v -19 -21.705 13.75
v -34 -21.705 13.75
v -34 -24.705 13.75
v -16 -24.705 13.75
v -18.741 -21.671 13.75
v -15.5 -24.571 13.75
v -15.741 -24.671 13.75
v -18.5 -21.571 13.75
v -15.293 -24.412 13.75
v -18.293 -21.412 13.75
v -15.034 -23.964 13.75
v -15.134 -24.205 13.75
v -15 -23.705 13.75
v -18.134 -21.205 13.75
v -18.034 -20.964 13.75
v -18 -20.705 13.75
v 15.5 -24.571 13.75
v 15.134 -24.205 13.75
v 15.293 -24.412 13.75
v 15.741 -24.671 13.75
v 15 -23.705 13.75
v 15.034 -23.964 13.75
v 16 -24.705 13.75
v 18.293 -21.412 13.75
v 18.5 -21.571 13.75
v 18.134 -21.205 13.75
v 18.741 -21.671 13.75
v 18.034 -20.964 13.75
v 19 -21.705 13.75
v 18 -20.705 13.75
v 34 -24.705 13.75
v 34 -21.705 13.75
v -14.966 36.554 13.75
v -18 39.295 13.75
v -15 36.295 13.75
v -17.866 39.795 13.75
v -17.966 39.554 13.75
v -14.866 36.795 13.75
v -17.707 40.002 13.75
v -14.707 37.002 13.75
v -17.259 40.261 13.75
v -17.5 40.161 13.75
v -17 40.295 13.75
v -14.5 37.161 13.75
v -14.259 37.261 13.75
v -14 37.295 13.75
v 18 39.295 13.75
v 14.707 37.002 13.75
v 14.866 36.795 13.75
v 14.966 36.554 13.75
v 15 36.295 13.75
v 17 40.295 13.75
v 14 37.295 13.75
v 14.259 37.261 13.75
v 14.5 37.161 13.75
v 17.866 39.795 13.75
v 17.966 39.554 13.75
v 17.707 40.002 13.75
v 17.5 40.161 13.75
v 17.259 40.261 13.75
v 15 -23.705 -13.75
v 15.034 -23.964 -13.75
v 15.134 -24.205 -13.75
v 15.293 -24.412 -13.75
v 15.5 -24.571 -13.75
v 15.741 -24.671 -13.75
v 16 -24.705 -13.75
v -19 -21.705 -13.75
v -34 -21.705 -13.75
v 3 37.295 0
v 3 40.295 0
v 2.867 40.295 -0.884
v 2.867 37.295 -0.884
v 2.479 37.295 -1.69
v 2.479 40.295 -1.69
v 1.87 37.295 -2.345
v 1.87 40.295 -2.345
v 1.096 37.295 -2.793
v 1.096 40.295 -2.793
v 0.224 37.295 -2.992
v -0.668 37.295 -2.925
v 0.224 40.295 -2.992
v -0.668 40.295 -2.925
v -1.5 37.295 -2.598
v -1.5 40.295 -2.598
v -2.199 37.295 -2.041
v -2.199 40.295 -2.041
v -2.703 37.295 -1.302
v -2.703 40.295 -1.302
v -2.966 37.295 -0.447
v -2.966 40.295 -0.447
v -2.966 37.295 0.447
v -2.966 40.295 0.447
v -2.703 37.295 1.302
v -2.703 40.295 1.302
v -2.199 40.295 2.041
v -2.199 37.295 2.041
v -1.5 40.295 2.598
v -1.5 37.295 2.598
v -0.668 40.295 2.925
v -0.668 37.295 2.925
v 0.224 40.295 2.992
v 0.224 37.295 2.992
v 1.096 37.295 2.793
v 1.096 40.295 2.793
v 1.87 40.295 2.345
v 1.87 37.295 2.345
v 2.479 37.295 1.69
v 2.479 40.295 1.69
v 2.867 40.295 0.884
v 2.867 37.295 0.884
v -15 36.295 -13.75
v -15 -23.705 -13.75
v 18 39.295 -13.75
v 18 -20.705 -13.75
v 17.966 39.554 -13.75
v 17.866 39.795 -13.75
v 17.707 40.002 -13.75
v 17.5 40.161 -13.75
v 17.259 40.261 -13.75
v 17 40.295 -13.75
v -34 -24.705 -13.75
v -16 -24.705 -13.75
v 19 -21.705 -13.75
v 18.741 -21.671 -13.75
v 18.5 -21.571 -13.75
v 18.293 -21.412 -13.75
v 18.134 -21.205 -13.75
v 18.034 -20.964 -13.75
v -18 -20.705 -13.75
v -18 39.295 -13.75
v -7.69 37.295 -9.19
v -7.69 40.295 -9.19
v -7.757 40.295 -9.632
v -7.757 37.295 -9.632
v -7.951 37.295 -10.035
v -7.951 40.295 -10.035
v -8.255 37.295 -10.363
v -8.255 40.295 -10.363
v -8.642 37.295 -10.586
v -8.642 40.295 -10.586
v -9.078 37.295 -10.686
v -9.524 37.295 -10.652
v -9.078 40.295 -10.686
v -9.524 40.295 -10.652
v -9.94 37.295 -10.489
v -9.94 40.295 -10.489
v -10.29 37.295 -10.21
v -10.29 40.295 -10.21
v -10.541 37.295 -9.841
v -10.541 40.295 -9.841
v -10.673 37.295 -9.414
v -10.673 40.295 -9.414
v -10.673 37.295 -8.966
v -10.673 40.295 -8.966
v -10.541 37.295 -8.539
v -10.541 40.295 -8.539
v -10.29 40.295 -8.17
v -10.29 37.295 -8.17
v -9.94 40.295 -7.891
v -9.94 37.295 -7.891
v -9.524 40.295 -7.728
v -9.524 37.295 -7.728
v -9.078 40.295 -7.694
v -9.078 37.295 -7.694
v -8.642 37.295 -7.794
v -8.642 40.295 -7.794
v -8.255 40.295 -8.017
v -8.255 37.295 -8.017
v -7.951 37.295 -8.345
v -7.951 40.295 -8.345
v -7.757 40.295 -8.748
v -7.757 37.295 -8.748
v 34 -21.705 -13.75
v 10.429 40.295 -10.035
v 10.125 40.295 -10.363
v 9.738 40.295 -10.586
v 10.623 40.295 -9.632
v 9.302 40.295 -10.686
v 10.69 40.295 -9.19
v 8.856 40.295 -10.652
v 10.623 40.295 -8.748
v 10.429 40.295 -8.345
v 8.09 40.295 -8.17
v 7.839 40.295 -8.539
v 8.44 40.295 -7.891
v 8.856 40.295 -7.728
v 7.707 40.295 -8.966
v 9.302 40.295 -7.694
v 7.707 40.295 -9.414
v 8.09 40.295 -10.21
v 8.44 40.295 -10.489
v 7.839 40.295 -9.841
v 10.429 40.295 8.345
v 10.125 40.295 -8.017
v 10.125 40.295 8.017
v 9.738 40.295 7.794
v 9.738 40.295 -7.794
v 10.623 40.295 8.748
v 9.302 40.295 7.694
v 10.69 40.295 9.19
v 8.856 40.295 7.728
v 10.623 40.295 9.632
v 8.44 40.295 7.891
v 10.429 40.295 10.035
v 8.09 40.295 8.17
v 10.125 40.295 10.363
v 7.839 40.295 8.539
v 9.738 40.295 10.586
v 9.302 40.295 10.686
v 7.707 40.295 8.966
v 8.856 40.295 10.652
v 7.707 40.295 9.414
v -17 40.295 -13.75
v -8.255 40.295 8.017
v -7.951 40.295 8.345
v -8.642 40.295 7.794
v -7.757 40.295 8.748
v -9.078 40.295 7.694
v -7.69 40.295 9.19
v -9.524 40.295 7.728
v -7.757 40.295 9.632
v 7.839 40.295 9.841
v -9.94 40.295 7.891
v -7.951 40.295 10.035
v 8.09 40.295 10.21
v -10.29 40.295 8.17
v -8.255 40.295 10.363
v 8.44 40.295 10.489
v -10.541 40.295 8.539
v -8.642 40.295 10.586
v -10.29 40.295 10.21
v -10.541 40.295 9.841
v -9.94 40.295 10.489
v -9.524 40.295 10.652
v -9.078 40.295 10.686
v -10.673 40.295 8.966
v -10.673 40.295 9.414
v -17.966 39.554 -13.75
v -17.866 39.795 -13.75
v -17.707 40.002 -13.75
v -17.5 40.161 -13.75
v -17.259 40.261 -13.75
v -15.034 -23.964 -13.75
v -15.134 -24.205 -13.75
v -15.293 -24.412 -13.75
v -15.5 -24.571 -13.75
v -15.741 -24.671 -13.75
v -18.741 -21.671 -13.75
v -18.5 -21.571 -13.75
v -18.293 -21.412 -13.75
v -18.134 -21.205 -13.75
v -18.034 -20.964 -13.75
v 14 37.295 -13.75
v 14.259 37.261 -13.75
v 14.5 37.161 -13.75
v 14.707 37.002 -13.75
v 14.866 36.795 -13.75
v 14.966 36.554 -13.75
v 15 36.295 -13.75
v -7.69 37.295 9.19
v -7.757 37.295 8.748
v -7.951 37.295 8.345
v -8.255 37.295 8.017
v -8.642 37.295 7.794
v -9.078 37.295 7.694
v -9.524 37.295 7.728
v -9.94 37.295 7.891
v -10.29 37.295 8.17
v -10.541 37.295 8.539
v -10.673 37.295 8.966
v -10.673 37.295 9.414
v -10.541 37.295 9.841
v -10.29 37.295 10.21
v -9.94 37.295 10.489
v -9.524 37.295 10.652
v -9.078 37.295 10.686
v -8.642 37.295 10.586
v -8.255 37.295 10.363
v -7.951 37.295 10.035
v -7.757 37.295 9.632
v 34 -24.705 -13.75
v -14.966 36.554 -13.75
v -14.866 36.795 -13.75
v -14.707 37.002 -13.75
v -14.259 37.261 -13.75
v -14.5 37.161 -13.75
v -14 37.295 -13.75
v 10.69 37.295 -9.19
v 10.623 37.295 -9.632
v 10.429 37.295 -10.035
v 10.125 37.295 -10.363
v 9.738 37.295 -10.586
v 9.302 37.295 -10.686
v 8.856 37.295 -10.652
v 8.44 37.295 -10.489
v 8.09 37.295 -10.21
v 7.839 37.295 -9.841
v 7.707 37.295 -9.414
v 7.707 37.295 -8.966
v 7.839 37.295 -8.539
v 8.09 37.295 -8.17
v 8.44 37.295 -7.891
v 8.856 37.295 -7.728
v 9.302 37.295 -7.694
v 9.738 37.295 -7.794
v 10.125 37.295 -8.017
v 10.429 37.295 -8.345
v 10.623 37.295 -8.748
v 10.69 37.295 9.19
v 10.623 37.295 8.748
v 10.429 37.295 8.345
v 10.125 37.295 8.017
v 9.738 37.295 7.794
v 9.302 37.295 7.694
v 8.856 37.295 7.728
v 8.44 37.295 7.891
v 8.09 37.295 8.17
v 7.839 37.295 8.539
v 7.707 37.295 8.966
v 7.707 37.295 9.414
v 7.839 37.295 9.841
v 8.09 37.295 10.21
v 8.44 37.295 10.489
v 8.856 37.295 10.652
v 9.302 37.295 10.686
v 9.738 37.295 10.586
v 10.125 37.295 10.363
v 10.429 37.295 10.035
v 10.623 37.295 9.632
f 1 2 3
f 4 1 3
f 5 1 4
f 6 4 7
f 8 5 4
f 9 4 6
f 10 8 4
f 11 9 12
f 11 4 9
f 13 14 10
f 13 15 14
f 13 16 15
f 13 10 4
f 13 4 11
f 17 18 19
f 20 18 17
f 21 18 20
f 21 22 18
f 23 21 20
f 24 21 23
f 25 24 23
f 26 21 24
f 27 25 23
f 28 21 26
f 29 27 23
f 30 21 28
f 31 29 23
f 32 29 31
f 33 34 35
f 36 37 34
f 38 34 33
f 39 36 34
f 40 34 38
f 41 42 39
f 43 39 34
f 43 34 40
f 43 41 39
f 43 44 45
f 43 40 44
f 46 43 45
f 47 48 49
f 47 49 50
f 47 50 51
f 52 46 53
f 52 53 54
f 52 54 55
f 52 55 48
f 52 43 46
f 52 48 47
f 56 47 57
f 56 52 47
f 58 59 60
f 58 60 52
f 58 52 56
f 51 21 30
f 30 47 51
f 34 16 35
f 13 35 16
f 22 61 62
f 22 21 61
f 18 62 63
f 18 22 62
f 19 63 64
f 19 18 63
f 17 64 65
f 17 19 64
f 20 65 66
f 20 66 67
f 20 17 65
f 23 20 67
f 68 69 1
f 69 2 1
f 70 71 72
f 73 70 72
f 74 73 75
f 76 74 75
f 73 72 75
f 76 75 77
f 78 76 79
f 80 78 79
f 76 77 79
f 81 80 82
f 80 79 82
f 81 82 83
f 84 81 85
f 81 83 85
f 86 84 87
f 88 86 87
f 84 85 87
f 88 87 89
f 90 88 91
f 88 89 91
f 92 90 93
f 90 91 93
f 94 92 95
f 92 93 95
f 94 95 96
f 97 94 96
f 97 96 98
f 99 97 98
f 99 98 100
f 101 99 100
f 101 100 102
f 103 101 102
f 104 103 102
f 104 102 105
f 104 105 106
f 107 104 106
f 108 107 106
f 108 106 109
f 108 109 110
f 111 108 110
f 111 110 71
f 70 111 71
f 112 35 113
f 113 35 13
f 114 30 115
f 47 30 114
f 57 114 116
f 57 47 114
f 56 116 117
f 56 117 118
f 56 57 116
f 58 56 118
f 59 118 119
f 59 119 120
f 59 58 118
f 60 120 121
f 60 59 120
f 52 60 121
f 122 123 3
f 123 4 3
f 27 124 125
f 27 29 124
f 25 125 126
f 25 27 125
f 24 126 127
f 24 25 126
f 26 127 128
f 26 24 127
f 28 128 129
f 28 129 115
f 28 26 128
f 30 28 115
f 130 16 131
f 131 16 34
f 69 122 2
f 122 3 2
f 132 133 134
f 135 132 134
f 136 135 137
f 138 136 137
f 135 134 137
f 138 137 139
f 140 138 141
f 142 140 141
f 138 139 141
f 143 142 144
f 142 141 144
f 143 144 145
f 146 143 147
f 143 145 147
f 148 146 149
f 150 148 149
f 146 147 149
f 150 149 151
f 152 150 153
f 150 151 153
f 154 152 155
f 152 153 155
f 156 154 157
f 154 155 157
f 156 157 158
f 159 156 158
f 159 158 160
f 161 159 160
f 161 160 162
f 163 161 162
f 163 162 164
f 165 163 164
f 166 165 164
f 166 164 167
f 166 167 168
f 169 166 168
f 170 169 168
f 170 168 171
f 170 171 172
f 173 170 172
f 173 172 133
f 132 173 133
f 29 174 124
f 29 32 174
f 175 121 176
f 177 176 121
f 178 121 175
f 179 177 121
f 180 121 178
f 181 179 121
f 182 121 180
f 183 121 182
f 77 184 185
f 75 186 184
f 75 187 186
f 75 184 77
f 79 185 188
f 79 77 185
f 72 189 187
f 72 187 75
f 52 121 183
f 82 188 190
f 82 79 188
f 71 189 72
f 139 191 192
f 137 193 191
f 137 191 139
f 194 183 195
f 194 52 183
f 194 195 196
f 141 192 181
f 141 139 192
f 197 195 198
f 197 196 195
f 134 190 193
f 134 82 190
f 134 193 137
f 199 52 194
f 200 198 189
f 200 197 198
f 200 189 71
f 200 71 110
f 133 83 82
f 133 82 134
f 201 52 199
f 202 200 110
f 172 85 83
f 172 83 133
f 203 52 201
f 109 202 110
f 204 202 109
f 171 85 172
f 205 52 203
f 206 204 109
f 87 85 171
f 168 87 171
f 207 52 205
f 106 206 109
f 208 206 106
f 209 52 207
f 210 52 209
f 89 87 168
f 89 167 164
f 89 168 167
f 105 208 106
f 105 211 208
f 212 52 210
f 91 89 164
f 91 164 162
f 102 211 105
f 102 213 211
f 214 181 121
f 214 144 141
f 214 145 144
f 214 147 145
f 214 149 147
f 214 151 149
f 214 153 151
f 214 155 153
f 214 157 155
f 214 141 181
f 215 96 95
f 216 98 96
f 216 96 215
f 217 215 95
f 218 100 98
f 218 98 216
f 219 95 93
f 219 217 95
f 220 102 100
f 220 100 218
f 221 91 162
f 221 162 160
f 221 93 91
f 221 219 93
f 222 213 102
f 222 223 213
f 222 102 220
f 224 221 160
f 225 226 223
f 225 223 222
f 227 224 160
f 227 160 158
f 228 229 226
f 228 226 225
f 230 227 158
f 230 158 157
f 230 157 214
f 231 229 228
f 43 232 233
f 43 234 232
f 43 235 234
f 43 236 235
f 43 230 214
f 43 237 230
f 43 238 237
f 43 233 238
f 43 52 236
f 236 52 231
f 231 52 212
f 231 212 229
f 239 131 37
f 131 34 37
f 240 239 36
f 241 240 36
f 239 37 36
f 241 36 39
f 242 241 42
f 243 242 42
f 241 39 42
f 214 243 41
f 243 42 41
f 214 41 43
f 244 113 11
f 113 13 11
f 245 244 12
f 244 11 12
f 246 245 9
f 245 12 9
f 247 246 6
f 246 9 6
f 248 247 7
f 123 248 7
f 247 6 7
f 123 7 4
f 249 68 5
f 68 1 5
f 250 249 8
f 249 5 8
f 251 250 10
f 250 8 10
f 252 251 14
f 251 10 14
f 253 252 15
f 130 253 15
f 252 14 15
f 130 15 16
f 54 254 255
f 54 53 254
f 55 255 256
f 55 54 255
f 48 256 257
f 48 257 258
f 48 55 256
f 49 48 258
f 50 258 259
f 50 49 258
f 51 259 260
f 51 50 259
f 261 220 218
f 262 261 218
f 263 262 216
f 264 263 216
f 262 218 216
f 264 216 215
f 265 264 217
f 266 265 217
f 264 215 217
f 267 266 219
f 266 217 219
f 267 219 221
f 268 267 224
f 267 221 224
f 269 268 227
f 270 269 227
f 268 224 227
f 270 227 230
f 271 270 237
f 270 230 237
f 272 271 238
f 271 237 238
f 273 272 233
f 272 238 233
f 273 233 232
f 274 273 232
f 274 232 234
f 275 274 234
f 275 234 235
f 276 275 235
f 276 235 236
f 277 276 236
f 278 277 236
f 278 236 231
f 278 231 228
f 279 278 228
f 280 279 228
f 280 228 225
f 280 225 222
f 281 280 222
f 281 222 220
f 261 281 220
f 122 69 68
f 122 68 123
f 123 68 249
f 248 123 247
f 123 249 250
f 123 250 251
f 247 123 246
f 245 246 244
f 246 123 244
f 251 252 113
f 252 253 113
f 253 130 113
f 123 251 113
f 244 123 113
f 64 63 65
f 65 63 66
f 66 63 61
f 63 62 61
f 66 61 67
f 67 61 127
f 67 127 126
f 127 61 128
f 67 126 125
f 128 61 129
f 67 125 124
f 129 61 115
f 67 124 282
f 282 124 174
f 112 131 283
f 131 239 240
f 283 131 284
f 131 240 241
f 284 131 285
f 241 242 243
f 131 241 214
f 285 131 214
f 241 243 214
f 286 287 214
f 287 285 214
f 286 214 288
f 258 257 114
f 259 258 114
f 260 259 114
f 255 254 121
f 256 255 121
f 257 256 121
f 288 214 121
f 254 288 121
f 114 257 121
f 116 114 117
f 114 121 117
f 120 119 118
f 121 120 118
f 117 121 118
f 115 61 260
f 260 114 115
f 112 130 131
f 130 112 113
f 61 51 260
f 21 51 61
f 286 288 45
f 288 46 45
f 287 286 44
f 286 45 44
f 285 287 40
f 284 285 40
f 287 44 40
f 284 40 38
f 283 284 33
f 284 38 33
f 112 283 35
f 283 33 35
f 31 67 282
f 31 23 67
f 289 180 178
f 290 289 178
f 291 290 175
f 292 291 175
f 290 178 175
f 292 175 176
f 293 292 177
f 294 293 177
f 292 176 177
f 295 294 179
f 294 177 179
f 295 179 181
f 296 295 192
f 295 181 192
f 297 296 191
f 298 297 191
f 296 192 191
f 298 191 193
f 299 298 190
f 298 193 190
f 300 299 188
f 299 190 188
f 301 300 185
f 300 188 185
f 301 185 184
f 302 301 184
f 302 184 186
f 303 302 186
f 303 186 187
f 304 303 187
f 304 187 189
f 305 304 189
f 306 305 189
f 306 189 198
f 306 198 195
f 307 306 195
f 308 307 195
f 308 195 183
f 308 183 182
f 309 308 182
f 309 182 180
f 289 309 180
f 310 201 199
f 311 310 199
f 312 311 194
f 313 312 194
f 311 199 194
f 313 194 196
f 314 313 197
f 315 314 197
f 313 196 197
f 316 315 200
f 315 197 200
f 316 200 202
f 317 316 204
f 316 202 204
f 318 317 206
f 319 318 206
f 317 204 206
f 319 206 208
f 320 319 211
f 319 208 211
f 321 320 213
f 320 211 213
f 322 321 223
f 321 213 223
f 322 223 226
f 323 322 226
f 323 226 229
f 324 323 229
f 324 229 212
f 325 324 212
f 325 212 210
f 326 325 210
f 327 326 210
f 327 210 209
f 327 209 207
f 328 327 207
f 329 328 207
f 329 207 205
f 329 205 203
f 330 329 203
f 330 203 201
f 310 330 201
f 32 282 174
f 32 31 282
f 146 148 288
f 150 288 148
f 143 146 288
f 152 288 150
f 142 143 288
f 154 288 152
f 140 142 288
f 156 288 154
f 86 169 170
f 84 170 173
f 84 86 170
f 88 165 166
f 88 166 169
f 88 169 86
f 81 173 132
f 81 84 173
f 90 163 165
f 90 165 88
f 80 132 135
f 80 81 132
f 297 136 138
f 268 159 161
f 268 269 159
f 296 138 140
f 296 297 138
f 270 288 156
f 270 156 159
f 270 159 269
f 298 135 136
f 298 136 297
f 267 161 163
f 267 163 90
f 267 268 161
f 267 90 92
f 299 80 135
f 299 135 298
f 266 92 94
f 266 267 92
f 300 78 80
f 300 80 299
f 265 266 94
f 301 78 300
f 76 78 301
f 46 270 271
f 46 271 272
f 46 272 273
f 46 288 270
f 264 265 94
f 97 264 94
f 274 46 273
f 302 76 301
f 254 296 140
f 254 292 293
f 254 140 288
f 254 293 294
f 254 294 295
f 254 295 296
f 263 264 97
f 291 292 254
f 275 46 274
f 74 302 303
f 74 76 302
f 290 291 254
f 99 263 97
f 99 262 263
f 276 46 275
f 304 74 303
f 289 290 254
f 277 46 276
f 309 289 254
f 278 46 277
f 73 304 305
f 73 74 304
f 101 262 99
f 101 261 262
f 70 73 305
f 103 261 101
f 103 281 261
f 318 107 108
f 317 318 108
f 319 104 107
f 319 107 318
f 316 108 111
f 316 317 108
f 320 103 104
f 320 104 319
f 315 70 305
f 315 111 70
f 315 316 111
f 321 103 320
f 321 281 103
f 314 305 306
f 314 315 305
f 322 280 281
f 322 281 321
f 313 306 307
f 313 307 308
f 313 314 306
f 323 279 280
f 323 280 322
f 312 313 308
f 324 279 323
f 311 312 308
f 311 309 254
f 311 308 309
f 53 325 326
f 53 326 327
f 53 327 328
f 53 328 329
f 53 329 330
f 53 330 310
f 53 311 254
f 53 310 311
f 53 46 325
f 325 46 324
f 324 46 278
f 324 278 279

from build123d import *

# Parameters (mm, degrees)
BOSS_EXTRUDE1_DEPTH = 13.75
SKETCH2_R           = 3
SKETCH2_R_2         = 1.5
CUT_EXTRUDE1_DEPTH  = 66


with BuildPart() as part:
    # Sketch1 → Boss-Extrude1 (new body, symmetric)
    with BuildSketch(Plane.XY):
        with BuildLine():
            Line((0, 37.295033495), (-14, 37.295033495))
            ThreePointArc((-14, 37.295033495), (-14.707106781, 37.002140277), (-15, 36.295033495))
            Line((-15, 36.295033495), (-15, -23.704966505))
            ThreePointArc((-15, -23.704966505), (-15.292893219, -24.412073286), (-16, -24.704966505))
            Line((-16, -24.704966505), (-34, -24.704966505))
            Line((-34, -24.704966505), (-34, -21.704966505))
            Line((-34, -21.704966505), (-19, -21.704966505))
            ThreePointArc((-19, -21.704966505), (-18.292893219, -21.412073286), (-18, -20.704966505))
            Line((-18, -20.704966505), (-18, 39.295033495))
            ThreePointArc((-18, 39.295033495), (-17.707106781, 40.002140277), (-17, 40.295033495))
            Line((-17, 40.295033495), (0, 40.295033495))
            Line((0, 40.295033495), (0, 37.295033495))
        make_face()
    boss_extrude1 = extrude(amount=BOSS_EXTRUDE1_DEPTH, both=True)

    # Mirror1: Boss-Extrude1 across plane
    add(boss_extrude1.mirror(Plane(origin=(0, 0, 0), x_dir=(0, 0, 1), z_dir=(1, 0, 0))))

    # Sketch2 → Cut-Extrude1 (cut, through all)
    with BuildSketch(Plane(origin=(0, 40.295033495, 0), x_dir=(1, 0, 0), z_dir=(0, 1, 0))):
        Circle(SKETCH2_R)
        with Locations((-9.19, 9.19)):
            Circle(SKETCH2_R_2)
        with Locations((9.19, 9.19)):
            Circle(SKETCH2_R_2)
        with Locations((9.19, -9.19)):
            Circle(SKETCH2_R_2)
        with Locations((-9.19, -9.19)):
            Circle(SKETCH2_R_2)
    extrude(amount=-CUT_EXTRUDE1_DEPTH, mode=Mode.SUBTRACT)


solid = part.part
